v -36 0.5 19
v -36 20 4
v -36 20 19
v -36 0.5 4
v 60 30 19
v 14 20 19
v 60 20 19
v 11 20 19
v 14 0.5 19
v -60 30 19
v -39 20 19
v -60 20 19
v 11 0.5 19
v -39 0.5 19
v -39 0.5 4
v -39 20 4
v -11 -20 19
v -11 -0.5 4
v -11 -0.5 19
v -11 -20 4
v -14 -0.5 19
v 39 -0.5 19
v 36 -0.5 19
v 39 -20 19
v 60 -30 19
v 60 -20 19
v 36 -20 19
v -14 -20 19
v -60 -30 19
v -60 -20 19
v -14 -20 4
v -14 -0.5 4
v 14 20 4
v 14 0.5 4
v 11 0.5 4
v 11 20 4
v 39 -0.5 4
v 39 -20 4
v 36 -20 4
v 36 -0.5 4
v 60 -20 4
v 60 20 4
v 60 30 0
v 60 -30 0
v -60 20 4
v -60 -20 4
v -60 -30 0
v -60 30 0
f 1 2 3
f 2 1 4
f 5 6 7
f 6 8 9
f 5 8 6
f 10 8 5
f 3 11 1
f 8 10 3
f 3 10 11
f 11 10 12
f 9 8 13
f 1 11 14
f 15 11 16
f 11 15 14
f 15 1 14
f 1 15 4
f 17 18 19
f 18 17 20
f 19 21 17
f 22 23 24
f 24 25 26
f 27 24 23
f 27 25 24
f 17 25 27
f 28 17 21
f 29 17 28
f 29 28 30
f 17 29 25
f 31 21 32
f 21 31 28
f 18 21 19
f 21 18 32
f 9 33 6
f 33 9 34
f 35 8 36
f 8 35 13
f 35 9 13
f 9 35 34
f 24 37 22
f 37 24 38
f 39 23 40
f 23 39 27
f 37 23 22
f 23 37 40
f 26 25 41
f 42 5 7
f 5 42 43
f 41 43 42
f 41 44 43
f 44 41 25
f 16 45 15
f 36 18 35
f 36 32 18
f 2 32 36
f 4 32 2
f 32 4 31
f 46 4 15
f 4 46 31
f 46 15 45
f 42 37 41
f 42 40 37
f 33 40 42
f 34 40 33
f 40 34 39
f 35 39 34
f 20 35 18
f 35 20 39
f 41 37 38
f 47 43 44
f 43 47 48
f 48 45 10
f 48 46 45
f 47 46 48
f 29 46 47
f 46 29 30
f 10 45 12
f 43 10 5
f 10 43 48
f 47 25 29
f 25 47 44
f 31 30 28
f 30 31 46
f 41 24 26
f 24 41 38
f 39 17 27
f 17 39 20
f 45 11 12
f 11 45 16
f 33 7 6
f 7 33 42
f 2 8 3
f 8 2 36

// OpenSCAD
$fn = 32;

// ----------------------------------------------------------------------
// Rib frame 120 x 60 x 19
// 4 ribs at 25 mm pitch, staggered
// ----------------------------------------------------------------------

// --- parameters (mm) ---
frame = [120, 60, 4];  // base plate size (x, y, z)
rail_w = 10;           // side rail width
ribs = 4;              // number of ribs
rib_t = 3;             // rib thickness
rib_h = 15;            // rib height above the base plate
pitch = 25;            // pitch between rib centres

// --- derived feature positions (mm) ---
span = (ribs - 1) * pitch;          // = 75   distance between the outer ribs
origin_x = -span / 2;               // = -37.5   X of the first rib
rib_len = frame[1] / 2 - rail_w + 0.5;  // = 20.5   length of a staggered rib
rib_y = 0.5 + rib_len / 2;          // = 10.75   Y of a staggered rib centre
row_offset = 2 * rib_y;             // = 21.5   distance between the two rows
feature_centers = [
  [origin_x + 0 * pitch, rib_y],
  [origin_x + 1 * pitch, -rib_y],
  [origin_x + 2 * pitch, rib_y],
  [origin_x + 3 * pitch, -rib_y]
];   // rib centre line, drives the rib loop

// base plate, two side rails, then the ribs read straight off feature_centers
union() {
  translate([-frame[0] / 2, -frame[1] / 2, 0]) cube(frame);
  translate([-frame[0] / 2, -frame[1] / 2, 0]) cube([frame[0], rail_w, frame[2] + rib_h]);
  translate([-frame[0] / 2, frame[1] / 2 - rail_w, 0]) cube([frame[0], rail_w, frame[2] + rib_h]);
  for (centre = feature_centers)
    translate([centre[0] - rib_t / 2, centre[1] - rib_len / 2, frame[2] - 1])
      cube([rib_t, rib_len, rib_h + 1]);
}
